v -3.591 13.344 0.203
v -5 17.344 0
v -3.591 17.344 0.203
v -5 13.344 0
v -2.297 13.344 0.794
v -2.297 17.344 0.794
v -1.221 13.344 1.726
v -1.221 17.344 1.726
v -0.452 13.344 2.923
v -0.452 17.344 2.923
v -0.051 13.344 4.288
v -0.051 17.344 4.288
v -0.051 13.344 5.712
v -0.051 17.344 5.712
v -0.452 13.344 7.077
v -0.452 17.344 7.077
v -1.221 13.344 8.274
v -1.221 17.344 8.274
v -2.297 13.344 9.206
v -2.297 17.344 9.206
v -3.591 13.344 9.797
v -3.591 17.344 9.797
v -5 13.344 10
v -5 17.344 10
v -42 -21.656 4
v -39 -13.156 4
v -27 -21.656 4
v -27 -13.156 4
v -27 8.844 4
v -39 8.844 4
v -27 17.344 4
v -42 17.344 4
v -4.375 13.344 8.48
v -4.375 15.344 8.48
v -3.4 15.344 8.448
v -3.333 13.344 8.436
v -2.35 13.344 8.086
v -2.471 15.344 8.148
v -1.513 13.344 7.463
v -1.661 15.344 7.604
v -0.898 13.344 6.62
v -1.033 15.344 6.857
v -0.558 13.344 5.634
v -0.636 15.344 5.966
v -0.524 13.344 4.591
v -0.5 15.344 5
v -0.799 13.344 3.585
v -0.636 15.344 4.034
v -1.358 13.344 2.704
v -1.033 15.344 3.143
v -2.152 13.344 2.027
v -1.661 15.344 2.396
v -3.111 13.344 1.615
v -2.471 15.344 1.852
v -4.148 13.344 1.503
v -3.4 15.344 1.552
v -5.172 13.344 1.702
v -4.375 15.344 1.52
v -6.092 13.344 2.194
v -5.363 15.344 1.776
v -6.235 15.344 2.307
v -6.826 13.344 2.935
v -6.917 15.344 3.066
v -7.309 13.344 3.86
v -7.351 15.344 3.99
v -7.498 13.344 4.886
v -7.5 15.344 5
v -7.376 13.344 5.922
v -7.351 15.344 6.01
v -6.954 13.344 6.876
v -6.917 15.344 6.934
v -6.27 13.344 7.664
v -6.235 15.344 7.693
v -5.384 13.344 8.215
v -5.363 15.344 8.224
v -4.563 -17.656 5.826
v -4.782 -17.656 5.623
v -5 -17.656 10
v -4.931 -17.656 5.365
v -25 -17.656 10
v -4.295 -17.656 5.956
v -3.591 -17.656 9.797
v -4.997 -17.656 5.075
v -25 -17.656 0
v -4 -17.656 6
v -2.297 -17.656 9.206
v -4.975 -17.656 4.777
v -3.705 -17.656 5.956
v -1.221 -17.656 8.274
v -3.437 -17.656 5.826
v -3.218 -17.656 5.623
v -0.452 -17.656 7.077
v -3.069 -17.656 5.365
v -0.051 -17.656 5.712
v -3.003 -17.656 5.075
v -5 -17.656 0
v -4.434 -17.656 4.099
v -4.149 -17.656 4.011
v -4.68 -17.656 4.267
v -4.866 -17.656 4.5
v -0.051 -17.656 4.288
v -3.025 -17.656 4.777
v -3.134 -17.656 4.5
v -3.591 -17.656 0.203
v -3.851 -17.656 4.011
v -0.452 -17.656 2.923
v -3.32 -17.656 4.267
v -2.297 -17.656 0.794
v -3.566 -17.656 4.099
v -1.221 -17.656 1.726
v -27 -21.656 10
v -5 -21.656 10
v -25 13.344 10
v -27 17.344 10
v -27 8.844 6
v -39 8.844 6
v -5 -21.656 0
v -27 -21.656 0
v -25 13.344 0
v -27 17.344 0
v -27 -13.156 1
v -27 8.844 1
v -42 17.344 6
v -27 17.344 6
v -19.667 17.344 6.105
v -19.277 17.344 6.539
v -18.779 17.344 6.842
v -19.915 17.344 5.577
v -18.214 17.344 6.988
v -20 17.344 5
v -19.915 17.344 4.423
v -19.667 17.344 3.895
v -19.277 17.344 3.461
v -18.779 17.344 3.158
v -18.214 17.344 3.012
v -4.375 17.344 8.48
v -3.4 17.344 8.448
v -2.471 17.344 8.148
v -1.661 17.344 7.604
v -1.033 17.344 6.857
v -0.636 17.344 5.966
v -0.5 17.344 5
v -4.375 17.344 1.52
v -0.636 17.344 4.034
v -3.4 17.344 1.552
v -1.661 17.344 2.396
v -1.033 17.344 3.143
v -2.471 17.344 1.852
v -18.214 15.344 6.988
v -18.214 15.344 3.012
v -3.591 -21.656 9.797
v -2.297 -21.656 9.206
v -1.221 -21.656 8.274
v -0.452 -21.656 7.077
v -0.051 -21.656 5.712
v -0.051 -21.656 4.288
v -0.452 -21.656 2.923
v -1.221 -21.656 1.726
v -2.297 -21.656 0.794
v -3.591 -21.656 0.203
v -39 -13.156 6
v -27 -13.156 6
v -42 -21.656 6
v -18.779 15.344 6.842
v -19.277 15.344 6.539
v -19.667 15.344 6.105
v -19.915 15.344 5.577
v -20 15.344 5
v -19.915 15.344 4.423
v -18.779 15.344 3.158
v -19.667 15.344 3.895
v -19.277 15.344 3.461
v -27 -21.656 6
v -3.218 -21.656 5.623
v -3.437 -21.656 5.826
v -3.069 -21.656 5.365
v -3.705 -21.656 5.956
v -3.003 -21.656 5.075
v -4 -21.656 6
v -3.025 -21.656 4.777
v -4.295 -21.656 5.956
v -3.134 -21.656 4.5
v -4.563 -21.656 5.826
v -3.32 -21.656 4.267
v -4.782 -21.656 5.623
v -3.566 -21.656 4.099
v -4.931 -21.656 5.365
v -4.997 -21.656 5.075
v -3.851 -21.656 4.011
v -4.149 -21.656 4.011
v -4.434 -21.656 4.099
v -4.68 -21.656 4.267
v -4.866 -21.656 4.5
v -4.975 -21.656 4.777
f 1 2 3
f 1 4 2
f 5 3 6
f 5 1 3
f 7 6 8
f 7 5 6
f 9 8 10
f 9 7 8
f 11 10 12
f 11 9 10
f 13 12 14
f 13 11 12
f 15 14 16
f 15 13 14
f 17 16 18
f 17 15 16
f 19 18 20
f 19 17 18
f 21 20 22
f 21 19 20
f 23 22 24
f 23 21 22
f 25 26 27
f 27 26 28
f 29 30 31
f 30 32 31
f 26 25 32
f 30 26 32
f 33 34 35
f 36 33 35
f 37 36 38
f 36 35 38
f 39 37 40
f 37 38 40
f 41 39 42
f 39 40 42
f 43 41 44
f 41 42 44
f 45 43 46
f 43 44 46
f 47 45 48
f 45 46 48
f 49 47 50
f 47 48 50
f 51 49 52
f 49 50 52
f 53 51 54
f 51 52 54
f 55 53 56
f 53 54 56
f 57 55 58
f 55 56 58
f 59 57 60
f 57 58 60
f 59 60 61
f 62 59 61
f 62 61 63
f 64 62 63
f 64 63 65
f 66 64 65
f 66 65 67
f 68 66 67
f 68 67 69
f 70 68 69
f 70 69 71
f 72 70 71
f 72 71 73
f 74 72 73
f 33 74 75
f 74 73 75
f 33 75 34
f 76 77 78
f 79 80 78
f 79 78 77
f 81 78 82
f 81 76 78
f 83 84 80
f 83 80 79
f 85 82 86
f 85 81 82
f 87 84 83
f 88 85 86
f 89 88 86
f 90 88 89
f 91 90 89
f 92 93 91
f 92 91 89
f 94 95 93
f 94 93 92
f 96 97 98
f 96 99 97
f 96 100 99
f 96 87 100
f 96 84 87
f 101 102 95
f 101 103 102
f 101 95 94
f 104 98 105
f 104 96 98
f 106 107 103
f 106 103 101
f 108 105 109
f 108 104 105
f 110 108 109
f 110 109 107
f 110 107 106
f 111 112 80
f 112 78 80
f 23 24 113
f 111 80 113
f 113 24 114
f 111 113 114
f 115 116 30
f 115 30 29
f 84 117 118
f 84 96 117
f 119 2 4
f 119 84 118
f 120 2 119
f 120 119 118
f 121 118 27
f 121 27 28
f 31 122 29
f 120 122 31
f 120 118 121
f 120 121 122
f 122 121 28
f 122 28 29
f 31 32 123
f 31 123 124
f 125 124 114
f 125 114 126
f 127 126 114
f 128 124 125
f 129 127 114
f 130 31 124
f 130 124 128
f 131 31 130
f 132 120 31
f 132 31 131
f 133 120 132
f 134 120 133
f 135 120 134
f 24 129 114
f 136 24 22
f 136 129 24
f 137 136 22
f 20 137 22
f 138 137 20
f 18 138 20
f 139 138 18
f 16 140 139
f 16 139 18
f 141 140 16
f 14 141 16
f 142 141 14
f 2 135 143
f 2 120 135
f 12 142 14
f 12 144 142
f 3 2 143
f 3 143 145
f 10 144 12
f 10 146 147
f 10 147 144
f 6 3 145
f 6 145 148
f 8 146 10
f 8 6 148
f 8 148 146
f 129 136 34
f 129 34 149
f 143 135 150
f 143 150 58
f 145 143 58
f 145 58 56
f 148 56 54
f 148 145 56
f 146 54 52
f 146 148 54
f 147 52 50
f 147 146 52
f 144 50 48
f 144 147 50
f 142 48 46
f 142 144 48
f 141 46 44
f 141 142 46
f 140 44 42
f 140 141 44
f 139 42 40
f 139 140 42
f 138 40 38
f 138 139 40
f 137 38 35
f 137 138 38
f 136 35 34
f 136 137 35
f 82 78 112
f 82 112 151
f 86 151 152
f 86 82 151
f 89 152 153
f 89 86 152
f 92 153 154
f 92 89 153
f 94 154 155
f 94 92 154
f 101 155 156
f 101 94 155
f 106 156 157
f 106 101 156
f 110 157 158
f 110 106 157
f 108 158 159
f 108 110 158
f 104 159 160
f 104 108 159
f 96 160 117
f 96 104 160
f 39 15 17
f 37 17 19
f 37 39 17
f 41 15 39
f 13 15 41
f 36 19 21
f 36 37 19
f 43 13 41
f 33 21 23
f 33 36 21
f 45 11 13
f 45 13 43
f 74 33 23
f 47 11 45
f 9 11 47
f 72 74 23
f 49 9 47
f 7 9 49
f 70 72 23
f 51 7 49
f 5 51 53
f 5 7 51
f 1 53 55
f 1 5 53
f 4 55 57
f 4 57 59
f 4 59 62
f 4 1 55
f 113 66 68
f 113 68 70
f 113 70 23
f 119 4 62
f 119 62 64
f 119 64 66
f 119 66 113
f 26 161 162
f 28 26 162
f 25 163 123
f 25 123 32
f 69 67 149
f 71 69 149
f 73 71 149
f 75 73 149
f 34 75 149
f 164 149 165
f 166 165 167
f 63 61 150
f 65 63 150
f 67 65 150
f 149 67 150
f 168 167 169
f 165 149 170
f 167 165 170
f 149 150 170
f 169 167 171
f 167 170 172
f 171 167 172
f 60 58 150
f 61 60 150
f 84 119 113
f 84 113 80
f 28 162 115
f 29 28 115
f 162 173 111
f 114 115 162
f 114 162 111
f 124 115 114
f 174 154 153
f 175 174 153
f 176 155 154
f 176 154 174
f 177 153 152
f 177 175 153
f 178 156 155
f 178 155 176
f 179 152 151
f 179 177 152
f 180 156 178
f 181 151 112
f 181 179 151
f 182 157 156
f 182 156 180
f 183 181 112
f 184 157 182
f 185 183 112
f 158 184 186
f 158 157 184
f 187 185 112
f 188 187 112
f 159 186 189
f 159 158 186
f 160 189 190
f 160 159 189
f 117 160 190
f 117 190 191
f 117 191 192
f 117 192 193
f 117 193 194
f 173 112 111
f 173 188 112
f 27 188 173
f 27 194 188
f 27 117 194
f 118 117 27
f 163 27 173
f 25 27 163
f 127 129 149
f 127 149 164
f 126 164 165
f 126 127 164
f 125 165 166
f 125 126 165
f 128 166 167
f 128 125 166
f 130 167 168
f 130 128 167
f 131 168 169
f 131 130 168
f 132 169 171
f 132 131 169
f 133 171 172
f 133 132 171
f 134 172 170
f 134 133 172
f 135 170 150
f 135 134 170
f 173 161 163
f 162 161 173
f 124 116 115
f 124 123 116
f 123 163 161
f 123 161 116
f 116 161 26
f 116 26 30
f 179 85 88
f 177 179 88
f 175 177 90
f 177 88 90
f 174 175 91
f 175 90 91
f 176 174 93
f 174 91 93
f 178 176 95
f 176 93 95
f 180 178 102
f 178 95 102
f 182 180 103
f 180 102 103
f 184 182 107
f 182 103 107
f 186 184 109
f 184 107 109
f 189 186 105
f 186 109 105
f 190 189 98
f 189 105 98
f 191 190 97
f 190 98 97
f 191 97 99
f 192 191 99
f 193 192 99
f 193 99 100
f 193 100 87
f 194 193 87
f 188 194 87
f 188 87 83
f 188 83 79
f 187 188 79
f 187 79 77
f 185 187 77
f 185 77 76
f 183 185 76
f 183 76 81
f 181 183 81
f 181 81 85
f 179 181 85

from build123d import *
from build123d.topology import SkipClean

# Parameters (mm, degrees)
BOSS_EXTRUDE1_DEPTH = 10
SKETCH2_W           = 15
SKETCH2_H           = 2
BOSS_EXTRUDE2_DEPTH = 39
FILLET1_RADIUS      = 5
FILLET1_LENGTH      = 4
FILLET2_RADIUS      = 5
FILLET2_LENGTH      = 4
SKETCH6_R           = 1
CUT_EXTRUDE3_DEPTH  = 43
CUT_EXTRUDE4_DEPTH  = 2
SKETCH9_R           = 3.5
CUT_EXTRUDE5_DEPTH  = 8
SKETCH10_W          = 12
SKETCH10_H          = 22
CUT_EXTRUDE6_DEPTH  = 5


with BuildPart() as part:
    # Sketch1 → Boss-Extrude1 (new body)
    with BuildSketch(Plane.XY):
        Polygon((-27, 17.343669269), (0, 17.343669269), (0, 13.343669269), (-25, 13.343669269), (-25, -17.656330731), (0, -17.656330731), (0, -21.656330731), (-27, -21.656330731), align=None)
    extrude(amount=BOSS_EXTRUDE1_DEPTH)

    # Sketch2 → Boss-Extrude2 (add)
    with BuildSketch(Plane(origin=(0, 17.343669269, 0), x_dir=(1, 0, 0), z_dir=(0, 1, 0))):
        with Locations((-34.5, -5)):
            Rectangle(SKETCH2_W, SKETCH2_H)
    extrude(amount=-BOSS_EXTRUDE2_DEPTH)

    # Fillet1: full round fillet: the end face becomes a half cylinder, R = half its width
    fillet1_face = Plane((0, 15.343669269, 5), x_dir=(0, -1, 0), z_dir=(1, 0, 0))  # on the end face: x along it, z out of the body
    fillet1_slab = fillet1_face.offset(-FILLET1_RADIUS / 2) * Box(FILLET1_LENGTH, 2 * FILLET1_RADIUS, FILLET1_RADIUS, mode=Mode.PRIVATE)  # the body's end, R deep
    fillet1_round = Plane((-5, 15.343669269, 5), x_dir=(1, 0, 0), z_dir=(0, -1, 0)) * Cylinder(FILLET1_RADIUS, FILLET1_LENGTH, mode=Mode.PRIVATE)  # its axis R under the face
    add(fillet1_slab - fillet1_round, mode=Mode.SUBTRACT)

    # Fillet2: full round fillet: the end face becomes a half cylinder, R = half its width
    fillet2_face = Plane((0, -19.656330731, 5), x_dir=(0, 1, 0), z_dir=(1, 0, 0))  # on the end face: x along it, z out of the body
    fillet2_slab = fillet2_face.offset(-FILLET2_RADIUS / 2) * Box(FILLET2_LENGTH, 2 * FILLET2_RADIUS, FILLET2_RADIUS, mode=Mode.PRIVATE)  # the body's end, R deep
    fillet2_round = Plane((-5, -19.656330731, 5), x_dir=(1, 0, 0), z_dir=(0, 1, 0)) * Cylinder(FILLET2_RADIUS, FILLET2_LENGTH, mode=Mode.PRIVATE)  # its axis R under the face
    add(fillet2_slab - fillet2_round, mode=Mode.SUBTRACT)

    # Sketch6 → Cut-Extrude3 (cut)
    with BuildSketch(Plane(origin=(0, 17.343669269, 0), x_dir=(1, 0, 0), z_dir=(0, 1, 0))):
        with Locations(Location((-4, -5, 0), (0, 0, 270))):
            Circle(SKETCH6_R)
    extrude(amount=-CUT_EXTRUDE3_DEPTH, mode=Mode.SUBTRACT)

    # Sketch8 → Cut-Extrude4 (cut)
    with BuildSketch(Plane(origin=(0, 17.343669269, 0), x_dir=(1, 0, 0), z_dir=(0, 1, 0))):
        with BuildLine():
            Line((-18.214285714, -3.011512728), (-4.375, -1.520147273))
            ThreePointArc((-4.375, -1.520147273), (-0.5, -5), (-4.375, -8.479852727))
            Line((-4.375, -8.479852727), (-18.214285714, -6.988487272))
            ThreePointArc((-18.214285714, -6.988487272), (-20, -5), (-18.214285714, -3.011512728))
        make_face()
    extrude(amount=-CUT_EXTRUDE4_DEPTH, mode=Mode.SUBTRACT)

    # Sketch9 → Cut-Extrude5 (cut)
    with SkipClean():  # the faces are left unmerged after this step: merging them gives an invalid solid
        with BuildSketch(Plane(origin=(0, 17.343669269, 0), x_dir=(1, 0, 0), z_dir=(0, 1, 0))):
            with Locations(Location((-4, -5, 0), (0, 0, 263.849360172))):
                Circle(SKETCH9_R)
        extrude(amount=-CUT_EXTRUDE5_DEPTH, mode=Mode.SUBTRACT)

    # Sketch10 → Cut-Extrude6 (cut)
    with SkipClean():  # the faces are left unmerged after this step: merging them gives an invalid solid
        with BuildSketch(Plane.XY.offset(6)):
            with Locations((-33, -2.156330731)):
                Rectangle(SKETCH10_W, SKETCH10_H)
        extrude(amount=-CUT_EXTRUDE6_DEPTH, mode=Mode.SUBTRACT)


solid = part.part
